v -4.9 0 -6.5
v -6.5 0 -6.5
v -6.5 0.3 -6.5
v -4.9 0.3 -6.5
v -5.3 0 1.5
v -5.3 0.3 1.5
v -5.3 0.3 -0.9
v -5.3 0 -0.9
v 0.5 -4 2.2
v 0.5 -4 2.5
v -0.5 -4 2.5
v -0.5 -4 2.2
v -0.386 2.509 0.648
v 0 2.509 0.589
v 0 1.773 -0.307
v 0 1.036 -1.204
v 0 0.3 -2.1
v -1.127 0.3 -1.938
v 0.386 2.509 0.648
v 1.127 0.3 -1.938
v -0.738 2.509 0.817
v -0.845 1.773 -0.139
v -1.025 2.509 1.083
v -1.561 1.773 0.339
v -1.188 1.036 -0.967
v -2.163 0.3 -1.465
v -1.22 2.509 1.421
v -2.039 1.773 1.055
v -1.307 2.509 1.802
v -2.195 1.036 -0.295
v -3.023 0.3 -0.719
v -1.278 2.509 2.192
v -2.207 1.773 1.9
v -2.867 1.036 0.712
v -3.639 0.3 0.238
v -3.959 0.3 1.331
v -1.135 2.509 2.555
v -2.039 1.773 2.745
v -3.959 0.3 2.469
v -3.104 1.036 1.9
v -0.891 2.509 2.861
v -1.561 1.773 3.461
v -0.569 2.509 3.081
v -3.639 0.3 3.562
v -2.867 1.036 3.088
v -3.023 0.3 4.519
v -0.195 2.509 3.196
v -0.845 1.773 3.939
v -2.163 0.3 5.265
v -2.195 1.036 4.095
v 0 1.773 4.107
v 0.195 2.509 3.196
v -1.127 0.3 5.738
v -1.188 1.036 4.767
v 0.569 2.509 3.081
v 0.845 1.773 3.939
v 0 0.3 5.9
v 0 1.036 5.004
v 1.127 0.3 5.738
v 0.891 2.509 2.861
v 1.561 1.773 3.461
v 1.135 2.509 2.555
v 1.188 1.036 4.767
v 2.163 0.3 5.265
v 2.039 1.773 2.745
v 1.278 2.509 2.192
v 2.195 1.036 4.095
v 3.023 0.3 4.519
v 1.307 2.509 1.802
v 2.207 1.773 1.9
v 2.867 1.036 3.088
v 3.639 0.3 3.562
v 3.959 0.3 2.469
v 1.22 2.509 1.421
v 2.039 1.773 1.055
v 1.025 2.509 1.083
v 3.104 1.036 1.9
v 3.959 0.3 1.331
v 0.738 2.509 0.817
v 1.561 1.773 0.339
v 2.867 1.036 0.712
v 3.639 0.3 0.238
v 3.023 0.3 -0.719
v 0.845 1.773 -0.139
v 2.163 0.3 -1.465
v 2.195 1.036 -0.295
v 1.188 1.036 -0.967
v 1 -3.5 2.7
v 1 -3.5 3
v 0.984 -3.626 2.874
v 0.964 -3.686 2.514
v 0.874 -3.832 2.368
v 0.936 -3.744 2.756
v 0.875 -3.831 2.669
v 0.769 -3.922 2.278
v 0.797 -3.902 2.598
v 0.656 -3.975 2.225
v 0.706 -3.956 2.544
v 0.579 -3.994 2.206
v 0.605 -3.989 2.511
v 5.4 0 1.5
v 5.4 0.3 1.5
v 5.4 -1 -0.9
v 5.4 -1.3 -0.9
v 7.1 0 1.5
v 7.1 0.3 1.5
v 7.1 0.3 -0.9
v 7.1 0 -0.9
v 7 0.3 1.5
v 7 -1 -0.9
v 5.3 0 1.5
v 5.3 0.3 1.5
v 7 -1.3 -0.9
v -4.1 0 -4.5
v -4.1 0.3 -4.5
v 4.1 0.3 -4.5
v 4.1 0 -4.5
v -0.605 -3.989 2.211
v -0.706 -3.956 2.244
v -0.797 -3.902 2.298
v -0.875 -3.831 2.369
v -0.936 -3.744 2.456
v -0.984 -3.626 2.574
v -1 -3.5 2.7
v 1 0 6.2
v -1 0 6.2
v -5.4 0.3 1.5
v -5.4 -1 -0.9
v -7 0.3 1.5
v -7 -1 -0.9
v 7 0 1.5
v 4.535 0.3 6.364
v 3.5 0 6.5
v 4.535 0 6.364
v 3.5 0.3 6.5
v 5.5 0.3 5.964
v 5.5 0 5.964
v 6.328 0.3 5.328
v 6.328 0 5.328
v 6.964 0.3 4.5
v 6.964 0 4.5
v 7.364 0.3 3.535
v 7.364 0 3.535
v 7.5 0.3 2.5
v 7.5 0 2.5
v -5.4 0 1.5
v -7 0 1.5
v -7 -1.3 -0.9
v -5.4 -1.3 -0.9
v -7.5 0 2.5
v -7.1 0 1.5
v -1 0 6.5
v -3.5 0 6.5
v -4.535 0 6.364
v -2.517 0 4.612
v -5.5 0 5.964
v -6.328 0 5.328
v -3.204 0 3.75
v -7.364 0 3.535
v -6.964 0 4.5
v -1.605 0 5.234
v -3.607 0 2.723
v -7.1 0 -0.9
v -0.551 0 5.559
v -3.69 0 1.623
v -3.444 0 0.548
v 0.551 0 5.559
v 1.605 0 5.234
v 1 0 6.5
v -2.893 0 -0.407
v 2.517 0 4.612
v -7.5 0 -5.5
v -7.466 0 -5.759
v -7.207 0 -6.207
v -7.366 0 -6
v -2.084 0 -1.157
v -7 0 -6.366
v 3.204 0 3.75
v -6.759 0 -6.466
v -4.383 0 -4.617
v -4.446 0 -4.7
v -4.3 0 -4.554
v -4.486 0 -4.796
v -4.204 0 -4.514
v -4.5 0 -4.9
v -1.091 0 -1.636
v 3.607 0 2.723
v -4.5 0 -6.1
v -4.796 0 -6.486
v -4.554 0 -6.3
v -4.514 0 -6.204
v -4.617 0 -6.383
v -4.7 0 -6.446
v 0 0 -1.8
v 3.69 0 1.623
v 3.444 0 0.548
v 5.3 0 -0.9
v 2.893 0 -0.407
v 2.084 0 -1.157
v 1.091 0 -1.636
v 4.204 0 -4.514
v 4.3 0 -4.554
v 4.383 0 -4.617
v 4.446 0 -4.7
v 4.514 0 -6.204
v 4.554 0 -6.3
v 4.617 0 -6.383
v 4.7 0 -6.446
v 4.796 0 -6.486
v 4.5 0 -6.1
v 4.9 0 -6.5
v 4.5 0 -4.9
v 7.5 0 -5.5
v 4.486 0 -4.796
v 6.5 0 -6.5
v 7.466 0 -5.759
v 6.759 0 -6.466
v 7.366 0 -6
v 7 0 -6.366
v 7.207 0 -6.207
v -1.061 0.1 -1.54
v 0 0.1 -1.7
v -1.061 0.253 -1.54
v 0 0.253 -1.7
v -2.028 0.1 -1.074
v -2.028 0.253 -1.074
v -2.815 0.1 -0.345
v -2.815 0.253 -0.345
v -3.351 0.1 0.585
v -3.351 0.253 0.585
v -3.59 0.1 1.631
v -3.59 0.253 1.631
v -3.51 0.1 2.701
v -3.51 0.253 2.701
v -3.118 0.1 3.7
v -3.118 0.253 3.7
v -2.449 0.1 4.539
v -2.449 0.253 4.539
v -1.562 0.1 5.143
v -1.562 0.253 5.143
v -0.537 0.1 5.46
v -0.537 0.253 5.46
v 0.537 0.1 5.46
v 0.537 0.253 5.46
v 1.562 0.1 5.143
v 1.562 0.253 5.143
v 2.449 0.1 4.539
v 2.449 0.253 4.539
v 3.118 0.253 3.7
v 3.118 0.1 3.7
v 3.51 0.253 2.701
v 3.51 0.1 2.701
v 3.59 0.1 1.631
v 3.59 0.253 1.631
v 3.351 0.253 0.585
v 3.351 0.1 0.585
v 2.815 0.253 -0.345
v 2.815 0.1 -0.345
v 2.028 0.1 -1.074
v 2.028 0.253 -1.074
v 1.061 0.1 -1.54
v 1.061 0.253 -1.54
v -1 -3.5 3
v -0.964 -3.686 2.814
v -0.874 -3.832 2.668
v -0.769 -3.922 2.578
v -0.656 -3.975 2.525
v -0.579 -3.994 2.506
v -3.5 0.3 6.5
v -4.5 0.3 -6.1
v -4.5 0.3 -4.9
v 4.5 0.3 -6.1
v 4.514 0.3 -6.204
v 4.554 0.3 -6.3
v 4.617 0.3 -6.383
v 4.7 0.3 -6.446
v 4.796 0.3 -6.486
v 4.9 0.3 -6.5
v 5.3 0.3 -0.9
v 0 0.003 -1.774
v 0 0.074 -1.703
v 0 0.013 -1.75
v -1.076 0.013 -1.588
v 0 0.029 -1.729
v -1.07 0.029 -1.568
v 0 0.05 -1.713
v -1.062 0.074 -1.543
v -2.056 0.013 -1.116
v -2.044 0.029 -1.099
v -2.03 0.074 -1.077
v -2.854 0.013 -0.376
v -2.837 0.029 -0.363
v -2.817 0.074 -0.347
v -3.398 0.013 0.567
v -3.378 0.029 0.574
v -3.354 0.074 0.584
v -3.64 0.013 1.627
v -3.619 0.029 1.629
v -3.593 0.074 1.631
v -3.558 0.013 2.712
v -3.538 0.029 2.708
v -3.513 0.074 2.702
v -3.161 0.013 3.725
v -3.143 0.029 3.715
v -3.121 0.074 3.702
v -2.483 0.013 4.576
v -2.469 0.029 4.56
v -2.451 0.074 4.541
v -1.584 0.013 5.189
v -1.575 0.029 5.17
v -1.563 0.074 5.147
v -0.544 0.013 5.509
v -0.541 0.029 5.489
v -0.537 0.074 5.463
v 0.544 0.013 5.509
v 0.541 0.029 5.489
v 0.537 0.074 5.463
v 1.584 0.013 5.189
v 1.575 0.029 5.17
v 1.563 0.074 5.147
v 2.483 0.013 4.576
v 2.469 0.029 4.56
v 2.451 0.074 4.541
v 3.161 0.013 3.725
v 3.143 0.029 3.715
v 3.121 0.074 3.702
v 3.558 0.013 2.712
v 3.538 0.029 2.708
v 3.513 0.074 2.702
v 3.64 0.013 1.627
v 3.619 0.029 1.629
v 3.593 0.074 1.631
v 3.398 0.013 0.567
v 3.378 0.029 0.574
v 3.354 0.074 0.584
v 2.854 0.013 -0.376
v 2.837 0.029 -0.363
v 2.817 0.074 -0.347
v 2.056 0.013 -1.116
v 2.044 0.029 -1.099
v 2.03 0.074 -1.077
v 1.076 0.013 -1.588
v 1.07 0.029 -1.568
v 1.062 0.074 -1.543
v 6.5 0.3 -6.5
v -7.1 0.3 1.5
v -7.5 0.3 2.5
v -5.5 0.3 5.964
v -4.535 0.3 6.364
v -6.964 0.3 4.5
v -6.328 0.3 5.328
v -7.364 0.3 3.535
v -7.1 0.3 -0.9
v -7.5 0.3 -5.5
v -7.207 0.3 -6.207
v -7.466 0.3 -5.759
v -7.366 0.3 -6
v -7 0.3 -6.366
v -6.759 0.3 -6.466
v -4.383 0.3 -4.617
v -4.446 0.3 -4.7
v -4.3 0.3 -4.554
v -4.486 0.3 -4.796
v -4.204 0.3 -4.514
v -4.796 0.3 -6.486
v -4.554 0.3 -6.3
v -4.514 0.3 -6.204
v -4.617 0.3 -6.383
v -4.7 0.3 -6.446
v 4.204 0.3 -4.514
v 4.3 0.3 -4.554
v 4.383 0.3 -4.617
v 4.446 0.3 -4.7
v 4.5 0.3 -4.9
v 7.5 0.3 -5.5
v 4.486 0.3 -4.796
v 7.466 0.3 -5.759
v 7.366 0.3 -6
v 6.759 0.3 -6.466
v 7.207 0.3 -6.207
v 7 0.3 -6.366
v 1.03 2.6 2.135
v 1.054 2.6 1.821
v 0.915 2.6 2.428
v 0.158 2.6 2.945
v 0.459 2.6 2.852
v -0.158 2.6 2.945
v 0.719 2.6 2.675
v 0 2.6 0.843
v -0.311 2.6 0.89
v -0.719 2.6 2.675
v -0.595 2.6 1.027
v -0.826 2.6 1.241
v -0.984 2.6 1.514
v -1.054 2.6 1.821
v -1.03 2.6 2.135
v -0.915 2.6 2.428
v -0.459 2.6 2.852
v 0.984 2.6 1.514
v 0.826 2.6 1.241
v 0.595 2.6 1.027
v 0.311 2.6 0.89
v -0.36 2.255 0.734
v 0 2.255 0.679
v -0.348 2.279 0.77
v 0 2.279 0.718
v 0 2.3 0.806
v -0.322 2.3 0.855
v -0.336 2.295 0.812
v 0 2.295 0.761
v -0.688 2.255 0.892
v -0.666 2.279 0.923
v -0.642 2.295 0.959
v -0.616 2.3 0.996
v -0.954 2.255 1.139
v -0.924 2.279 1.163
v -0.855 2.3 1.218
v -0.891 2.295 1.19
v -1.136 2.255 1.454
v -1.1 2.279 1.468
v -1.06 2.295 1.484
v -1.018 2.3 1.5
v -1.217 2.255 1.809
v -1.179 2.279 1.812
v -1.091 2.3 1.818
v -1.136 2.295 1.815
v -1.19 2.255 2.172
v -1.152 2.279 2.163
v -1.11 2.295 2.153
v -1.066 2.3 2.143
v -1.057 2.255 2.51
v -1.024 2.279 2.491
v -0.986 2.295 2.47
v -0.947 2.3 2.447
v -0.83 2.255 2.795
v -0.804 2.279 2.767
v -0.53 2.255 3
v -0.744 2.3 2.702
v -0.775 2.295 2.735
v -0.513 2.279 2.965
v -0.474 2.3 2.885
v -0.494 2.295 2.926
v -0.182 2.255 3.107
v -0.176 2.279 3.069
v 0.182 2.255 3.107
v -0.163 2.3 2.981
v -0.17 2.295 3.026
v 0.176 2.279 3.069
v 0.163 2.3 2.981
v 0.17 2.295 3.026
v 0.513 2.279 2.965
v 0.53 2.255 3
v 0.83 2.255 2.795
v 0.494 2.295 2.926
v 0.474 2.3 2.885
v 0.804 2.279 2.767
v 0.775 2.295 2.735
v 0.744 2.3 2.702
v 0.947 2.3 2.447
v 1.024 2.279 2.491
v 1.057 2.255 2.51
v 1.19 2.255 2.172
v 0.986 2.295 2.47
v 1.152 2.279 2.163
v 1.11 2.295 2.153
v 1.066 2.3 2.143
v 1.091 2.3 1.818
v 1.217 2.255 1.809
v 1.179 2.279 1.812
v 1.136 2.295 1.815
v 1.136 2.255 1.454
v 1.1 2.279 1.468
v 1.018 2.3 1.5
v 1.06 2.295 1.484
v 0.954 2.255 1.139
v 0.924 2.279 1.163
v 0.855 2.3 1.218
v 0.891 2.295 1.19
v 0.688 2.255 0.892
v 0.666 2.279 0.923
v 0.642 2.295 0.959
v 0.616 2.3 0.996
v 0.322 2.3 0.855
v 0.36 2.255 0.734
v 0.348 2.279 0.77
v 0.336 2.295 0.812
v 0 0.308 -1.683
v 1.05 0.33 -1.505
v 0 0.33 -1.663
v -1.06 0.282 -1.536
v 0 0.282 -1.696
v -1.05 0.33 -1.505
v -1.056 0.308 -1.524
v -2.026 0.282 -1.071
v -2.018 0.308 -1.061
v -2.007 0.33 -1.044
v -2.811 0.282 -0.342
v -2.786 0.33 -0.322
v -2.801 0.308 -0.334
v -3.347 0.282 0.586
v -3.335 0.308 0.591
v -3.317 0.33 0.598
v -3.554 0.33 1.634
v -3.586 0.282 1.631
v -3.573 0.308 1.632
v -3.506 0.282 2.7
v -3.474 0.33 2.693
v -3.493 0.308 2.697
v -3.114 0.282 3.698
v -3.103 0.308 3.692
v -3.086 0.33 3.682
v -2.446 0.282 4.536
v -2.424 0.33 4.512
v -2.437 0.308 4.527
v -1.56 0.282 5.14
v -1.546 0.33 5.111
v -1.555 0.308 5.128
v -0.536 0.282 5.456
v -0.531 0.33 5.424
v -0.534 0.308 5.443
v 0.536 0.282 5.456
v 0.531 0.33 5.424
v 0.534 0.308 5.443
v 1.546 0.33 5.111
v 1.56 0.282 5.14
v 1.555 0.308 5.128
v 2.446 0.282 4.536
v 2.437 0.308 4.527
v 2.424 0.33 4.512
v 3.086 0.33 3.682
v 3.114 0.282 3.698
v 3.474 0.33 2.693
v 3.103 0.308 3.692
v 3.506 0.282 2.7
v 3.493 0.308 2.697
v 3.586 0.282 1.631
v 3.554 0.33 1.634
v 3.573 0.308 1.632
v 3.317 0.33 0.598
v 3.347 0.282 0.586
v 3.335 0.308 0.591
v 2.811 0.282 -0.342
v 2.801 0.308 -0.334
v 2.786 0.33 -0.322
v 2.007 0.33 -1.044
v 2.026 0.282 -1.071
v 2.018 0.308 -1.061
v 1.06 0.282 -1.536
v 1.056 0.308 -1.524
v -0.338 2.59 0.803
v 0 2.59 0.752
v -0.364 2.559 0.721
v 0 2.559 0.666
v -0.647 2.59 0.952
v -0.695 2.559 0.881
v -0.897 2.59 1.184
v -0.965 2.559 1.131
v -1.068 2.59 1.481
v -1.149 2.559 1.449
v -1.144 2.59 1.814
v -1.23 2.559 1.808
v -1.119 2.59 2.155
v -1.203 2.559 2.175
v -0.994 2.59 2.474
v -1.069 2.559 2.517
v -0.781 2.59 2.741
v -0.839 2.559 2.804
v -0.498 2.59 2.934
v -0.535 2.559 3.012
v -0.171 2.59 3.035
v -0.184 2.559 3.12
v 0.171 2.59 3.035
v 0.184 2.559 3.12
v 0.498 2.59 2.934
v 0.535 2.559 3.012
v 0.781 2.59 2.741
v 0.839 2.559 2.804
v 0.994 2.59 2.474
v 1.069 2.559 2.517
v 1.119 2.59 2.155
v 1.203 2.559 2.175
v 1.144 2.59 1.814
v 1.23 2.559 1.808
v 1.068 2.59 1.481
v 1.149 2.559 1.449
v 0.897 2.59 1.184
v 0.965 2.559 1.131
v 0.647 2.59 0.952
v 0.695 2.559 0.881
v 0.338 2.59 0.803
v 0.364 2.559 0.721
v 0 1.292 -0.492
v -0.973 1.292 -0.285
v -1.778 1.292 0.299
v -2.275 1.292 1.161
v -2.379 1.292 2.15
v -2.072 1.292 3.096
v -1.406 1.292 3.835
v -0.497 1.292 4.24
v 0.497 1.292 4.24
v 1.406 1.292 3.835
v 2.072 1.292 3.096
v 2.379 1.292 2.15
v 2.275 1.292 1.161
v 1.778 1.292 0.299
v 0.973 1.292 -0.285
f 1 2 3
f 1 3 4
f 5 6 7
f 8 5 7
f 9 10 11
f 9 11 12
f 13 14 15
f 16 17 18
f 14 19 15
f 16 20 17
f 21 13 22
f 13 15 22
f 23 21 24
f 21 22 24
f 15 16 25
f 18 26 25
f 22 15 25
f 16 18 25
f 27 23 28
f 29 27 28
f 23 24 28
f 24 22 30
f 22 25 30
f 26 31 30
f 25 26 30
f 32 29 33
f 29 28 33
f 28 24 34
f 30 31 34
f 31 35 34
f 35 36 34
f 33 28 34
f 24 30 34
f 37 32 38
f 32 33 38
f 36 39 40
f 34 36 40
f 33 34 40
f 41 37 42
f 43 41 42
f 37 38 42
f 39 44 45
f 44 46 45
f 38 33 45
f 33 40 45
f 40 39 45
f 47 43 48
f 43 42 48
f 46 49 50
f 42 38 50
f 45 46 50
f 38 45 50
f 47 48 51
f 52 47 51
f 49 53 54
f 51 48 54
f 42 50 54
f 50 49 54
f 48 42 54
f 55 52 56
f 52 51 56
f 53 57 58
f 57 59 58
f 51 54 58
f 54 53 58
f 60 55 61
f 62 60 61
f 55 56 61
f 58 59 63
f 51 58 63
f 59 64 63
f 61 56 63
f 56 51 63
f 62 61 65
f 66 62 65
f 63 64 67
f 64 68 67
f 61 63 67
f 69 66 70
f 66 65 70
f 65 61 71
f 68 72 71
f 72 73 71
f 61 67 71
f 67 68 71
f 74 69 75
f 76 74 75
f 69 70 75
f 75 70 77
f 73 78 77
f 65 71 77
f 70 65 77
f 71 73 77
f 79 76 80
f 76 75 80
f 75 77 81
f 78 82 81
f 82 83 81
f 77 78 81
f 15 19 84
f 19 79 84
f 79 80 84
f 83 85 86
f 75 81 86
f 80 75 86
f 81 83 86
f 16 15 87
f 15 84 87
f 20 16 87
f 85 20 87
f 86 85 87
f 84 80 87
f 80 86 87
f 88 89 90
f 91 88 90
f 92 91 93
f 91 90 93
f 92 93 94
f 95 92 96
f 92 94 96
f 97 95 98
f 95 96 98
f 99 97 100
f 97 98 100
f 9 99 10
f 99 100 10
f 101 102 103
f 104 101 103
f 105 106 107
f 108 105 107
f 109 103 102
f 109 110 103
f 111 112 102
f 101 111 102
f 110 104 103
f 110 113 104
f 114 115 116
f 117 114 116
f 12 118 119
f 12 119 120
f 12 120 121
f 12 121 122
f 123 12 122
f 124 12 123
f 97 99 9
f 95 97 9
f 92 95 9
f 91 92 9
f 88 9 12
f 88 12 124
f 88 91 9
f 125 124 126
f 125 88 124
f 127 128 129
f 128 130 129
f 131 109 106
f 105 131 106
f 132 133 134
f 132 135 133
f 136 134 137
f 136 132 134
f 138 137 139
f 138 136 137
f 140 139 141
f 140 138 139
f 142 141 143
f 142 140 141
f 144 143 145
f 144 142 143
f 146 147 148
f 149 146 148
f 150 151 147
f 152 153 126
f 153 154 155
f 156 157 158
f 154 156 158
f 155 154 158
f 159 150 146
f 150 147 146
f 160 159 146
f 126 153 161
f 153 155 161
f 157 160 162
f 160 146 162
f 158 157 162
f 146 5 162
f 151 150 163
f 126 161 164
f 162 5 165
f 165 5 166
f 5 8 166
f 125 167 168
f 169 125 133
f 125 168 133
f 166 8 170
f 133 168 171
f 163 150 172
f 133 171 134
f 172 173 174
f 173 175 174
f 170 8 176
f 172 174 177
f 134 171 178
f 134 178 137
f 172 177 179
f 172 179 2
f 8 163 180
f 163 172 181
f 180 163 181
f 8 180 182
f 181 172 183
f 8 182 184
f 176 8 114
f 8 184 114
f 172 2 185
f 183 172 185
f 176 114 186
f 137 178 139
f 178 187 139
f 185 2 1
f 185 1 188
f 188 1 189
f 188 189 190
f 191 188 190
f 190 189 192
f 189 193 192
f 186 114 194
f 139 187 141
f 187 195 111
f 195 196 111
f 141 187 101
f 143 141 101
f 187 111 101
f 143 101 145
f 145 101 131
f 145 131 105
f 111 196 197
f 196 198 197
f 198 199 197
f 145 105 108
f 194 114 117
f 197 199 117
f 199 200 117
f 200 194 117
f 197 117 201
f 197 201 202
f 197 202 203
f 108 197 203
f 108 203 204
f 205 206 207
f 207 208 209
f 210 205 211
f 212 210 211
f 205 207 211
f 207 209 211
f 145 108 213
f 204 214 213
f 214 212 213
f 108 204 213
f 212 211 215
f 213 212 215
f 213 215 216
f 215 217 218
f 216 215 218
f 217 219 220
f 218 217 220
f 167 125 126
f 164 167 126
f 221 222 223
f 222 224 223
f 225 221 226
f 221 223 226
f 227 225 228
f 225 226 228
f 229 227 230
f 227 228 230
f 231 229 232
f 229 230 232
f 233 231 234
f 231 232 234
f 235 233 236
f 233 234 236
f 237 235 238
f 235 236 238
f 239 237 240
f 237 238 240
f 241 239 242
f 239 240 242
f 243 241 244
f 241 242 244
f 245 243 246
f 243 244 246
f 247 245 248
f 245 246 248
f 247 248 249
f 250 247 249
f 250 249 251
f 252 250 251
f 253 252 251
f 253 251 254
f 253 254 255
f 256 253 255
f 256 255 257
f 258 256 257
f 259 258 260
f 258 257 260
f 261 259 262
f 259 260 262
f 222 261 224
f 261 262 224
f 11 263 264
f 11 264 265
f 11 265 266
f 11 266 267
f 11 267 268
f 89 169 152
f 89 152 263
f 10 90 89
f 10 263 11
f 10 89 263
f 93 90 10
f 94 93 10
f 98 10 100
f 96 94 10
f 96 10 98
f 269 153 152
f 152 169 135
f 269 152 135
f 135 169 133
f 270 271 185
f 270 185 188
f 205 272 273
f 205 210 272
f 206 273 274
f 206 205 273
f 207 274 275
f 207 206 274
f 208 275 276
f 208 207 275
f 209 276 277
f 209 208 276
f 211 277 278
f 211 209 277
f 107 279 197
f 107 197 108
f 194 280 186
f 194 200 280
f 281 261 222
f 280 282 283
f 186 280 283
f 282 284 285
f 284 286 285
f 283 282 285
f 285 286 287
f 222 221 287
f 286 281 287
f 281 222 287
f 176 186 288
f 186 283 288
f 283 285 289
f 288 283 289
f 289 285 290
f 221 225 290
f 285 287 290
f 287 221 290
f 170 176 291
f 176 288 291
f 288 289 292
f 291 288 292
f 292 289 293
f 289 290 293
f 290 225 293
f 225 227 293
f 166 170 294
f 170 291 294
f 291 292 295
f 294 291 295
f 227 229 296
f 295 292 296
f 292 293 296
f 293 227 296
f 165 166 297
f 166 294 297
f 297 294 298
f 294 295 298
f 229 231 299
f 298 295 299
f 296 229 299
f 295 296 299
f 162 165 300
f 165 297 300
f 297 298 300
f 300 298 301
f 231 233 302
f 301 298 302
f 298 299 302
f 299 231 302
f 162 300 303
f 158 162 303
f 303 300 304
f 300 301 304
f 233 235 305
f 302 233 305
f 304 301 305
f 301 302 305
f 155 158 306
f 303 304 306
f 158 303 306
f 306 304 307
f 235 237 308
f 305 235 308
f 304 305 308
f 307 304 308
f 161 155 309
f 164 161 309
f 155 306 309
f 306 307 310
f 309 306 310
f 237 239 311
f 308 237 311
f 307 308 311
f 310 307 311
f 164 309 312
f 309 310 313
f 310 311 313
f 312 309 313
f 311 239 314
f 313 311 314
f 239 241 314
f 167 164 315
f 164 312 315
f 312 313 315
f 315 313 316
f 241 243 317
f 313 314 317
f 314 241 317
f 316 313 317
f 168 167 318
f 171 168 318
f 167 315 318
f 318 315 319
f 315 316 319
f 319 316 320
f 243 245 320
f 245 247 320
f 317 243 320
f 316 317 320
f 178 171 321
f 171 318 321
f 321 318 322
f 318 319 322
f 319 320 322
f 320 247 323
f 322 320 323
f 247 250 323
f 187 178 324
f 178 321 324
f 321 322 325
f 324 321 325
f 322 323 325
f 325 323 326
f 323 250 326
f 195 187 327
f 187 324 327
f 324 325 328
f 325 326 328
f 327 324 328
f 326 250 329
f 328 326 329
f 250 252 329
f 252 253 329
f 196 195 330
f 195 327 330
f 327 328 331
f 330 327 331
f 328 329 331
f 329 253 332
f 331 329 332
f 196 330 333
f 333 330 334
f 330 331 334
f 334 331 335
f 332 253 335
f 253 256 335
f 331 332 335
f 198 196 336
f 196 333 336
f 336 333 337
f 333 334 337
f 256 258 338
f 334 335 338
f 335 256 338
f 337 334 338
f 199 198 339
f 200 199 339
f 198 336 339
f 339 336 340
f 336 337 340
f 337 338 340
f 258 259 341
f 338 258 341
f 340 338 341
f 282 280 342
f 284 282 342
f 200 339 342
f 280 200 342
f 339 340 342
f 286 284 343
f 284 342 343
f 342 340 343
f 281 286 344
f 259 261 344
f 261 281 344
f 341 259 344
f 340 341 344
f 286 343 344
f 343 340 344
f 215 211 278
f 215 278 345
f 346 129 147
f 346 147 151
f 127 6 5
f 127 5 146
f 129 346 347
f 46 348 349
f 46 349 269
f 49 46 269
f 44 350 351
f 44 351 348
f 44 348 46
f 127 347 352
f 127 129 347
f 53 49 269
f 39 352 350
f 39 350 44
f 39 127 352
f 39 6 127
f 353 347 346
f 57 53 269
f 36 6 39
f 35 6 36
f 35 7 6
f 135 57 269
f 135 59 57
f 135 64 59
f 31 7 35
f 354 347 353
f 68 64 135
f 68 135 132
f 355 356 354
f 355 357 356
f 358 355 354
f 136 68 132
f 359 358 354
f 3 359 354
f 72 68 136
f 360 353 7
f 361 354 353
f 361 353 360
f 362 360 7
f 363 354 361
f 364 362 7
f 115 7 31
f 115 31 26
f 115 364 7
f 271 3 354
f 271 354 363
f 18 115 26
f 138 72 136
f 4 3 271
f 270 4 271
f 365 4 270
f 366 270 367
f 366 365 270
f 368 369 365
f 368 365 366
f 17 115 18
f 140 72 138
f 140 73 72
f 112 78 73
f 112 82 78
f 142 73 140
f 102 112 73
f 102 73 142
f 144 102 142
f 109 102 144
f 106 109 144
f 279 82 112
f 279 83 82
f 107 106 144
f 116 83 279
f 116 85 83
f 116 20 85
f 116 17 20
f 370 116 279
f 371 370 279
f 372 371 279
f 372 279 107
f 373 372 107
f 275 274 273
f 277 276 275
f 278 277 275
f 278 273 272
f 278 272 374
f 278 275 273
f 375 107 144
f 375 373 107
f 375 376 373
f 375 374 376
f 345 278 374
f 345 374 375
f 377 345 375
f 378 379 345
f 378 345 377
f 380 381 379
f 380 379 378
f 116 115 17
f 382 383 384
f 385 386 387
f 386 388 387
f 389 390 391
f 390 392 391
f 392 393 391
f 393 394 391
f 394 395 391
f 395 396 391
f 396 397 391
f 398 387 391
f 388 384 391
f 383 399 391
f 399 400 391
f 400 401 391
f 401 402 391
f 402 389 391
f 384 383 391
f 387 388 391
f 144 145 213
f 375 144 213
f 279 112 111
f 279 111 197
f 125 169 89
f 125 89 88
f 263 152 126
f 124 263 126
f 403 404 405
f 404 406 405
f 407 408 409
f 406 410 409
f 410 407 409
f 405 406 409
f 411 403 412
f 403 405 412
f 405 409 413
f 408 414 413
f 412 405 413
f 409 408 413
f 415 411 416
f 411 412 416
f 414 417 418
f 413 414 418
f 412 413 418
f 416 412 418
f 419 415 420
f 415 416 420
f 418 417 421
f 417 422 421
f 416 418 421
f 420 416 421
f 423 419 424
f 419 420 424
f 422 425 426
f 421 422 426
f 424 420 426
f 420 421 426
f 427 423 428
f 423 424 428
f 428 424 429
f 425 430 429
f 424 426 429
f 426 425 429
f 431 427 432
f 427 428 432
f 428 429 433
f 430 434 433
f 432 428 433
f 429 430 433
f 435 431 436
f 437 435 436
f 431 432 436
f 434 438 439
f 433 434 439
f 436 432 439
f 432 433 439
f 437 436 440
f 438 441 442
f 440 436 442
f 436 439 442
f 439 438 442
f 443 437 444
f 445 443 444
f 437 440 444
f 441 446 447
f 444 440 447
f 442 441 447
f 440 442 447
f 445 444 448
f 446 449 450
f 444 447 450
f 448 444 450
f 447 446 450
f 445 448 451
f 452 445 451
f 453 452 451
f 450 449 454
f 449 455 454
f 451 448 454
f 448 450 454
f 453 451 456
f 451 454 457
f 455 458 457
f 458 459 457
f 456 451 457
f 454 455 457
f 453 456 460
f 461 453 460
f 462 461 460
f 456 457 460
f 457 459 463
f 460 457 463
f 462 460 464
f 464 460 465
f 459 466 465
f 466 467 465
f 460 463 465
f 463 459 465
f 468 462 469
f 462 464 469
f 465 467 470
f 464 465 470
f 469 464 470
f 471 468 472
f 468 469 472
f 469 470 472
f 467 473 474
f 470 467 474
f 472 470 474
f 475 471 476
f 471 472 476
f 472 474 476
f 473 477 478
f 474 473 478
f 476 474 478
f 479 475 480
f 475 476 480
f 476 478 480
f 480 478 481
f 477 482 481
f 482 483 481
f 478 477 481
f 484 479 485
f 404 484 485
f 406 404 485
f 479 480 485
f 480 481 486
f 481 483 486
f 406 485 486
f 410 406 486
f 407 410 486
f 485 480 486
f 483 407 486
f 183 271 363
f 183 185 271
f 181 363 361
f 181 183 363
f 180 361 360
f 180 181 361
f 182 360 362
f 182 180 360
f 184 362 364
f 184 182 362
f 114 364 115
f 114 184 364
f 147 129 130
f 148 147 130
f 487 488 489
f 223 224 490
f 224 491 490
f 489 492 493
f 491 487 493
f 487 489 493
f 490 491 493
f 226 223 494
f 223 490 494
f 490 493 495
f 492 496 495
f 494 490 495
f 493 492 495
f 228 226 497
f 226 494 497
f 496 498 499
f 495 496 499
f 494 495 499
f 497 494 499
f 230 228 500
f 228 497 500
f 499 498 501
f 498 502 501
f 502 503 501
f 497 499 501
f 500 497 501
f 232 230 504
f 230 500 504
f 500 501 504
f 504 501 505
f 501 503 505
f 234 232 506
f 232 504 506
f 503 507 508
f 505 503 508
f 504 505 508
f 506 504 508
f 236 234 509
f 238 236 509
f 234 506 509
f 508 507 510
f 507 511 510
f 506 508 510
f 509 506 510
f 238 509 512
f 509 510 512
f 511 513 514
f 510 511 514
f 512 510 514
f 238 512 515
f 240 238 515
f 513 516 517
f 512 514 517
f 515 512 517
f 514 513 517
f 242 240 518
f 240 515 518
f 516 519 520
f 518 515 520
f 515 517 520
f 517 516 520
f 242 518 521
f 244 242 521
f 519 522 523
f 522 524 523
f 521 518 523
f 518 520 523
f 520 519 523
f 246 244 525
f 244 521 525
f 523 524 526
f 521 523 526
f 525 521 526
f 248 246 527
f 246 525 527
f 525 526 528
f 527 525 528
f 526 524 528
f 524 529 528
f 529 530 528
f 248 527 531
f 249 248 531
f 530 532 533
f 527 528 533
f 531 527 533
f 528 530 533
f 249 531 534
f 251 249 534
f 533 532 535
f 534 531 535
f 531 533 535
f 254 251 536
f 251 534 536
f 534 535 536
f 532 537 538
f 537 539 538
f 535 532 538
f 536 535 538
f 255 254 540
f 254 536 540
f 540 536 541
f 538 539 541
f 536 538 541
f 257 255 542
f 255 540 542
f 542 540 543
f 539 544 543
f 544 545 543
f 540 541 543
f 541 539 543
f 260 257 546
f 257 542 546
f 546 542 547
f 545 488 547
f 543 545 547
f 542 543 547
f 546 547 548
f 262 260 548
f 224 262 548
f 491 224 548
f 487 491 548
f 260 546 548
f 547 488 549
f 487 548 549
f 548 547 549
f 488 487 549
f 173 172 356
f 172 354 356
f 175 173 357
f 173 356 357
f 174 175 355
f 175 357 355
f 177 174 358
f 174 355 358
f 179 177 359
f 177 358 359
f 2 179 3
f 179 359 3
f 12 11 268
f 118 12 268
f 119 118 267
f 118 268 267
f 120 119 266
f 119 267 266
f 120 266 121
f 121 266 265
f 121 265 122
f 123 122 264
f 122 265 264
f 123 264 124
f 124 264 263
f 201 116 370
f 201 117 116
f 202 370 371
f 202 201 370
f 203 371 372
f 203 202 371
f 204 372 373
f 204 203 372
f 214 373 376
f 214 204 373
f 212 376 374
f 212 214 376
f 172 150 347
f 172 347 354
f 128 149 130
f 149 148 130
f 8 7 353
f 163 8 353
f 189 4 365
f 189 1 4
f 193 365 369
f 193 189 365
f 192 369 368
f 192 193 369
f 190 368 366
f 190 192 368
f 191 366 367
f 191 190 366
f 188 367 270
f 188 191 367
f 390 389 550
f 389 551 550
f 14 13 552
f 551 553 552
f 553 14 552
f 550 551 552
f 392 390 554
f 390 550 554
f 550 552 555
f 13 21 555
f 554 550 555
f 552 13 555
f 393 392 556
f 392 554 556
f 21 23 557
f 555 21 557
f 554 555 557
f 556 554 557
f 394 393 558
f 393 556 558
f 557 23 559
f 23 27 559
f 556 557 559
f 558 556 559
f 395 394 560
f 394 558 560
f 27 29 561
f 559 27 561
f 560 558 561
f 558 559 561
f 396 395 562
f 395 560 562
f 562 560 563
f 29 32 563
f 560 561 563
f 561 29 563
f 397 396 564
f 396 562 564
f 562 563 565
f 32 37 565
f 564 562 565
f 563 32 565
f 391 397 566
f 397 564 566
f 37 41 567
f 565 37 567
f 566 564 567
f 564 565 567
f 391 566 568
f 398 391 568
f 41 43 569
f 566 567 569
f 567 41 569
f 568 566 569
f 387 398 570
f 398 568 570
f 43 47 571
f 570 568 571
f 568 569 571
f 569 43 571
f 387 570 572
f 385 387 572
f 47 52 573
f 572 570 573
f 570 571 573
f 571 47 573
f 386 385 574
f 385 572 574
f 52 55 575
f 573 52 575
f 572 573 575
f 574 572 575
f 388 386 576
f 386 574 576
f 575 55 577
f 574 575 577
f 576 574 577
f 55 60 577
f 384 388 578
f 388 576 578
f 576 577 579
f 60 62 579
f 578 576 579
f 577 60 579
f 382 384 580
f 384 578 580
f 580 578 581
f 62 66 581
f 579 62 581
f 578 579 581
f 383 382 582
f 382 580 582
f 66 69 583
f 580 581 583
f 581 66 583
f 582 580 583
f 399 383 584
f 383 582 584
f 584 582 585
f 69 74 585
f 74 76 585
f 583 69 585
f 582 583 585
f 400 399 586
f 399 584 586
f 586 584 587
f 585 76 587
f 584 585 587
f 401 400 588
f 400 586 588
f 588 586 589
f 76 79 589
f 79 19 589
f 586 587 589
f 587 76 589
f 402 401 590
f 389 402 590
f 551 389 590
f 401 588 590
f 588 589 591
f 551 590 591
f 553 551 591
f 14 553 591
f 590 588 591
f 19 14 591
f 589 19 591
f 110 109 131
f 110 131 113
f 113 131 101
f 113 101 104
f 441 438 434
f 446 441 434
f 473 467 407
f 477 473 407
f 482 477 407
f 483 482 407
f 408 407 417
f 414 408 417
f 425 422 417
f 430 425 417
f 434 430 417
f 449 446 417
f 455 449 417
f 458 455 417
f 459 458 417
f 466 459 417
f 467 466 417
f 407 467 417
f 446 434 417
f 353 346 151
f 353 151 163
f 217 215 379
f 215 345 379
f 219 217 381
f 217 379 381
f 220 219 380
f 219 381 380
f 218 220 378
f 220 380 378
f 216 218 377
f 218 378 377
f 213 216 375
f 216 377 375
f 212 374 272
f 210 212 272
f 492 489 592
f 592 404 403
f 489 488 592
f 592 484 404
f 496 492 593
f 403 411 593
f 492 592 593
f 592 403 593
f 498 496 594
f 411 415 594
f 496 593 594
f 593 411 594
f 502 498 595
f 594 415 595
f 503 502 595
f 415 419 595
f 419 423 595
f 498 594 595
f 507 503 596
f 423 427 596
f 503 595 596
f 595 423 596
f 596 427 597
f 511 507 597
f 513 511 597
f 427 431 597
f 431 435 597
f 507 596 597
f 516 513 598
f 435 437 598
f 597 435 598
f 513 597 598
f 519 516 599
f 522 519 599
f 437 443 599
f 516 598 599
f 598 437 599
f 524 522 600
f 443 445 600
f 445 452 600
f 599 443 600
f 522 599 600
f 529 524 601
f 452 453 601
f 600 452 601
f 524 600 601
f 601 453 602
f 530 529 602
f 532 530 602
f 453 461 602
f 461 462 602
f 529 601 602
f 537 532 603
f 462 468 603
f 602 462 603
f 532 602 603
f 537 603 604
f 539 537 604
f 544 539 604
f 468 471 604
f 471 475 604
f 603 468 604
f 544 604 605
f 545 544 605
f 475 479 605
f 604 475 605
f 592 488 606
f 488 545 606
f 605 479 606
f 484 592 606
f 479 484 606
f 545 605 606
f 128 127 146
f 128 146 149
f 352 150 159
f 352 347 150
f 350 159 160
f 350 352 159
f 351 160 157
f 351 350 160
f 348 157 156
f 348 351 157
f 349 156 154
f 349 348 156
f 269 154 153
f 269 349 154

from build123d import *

# Parameters (mm, degrees)
SKETCH1_W               = 15
SKETCH1_H               = 13
BASE_DEPTH              = 0.3
SKETCH2_R               = 4
PT_CUT_DEPTH            = 10.92924972
WIRE_CONNECTION_DEPTH   = 1
SKETCH7_W               = 1.8
SKETCH7_H               = 2.4
LOCKING_CLAMP_CUT_DEPTH = 11.816191566
LOCKING_CLAMP_DEPTH     = 0.8
SKETCH9_W               = 9
SKETCH9_H               = 2
BOTTOM_SLOT_CUT_DEPTH   = 11.816191566
TS_F_R                  = 1
BS_F_R                  = 4
WC_F_R                  = 0.5
BSC_F_R                 = 0.4


with BuildPart() as part:
    # Sketch1 → BASE (new body)
    with BuildSketch(Plane(origin=(0, 0, 0), x_dir=(1, 0, 0), z_dir=(0, 1, 0))):
        Rectangle(SKETCH1_W, SKETCH1_H)
    extrude(amount=BASE_DEPTH)

    # Sketch2 → PT CUT (cut, through all)
    with BuildSketch(Plane(origin=(0, 0.3, 0), x_dir=(1, 0, 0), z_dir=(0, 1, 0))):
        with Locations(Location((0, -1.9, 0), (0, 0, 270))):
            Circle(SKETCH2_R)
    extrude(amount=-PT_CUT_DEPTH, mode=Mode.SUBTRACT)

    # Sketch4 → POSITIVE TERMINAL (revolve)
    with BuildSketch(Plane.XY.offset(1.9), mode=Mode.PRIVATE) as positive_terminal_sk:
        with BuildLine():
            Line((0, 2.6), (1.056776663, 2.6))
            ThreePointArc((1.056776663, 2.6), (1.191616938, 2.576587441), (1.310672433, 2.509090502))
            Line((1.310672433, 2.509090502), (4, 0.3))
            Line((4, 0.3), (4, 0))
            Line((4, 0), (3.7, 0))
            ThreePointArc((3.7, 0), (3.629289322, 0.029289322), (3.6, 0.1))
            Line((3.6, 0.1), (3.6, 0.252730922))
            ThreePointArc((3.6, 0.252730922), (3.590408501, 0.295466187), (3.563473942, 0.330003547))
            Line((3.563473942, 0.330003547), (1.220553608, 2.254545251))
            ThreePointArc((1.220553608, 2.254545251), (1.16102586, 2.28829372), (1.093605723, 2.3))
            Line((1.093605723, 2.3), (0, 2.3))
            Line((0, 2.3), (0, 2.6))
        make_face()
    revolve(positive_terminal_sk.sketch.rotate(Axis((0, 0, 1.9), (0, 1, 0)), 90), axis=Axis((0, 0, 1.9), (0, 1, 0)))

    # Sketch5 → WIRE CONNECTION (add, symmetric)
    with BuildSketch(Plane(origin=(0, 0, 0), x_dir=(0, 0, -1), z_dir=(1, 0, 0))):
        Polygon((-6.5, 0), (-2.5, -4), (-2.2, -4), (-6.2, 0), align=None)
    extrude(amount=WIRE_CONNECTION_DEPTH, both=True)

    # Sketch7 → LOCKING CLAMP CUT (cut, through all)
    with BuildSketch(Plane(origin=(0, 0.3, 0), x_dir=(1, 0, 0), z_dir=(0, 1, 0))):
        with Locations((6.2, -0.3)):
            Rectangle(SKETCH7_W, SKETCH7_H)
    locking_clamp_cut = extrude(amount=-LOCKING_CLAMP_CUT_DEPTH, mode=Mode.SUBTRACT)

    # Sketch8 → LOCKING CLAMP (add, symmetric)
    with BuildSketch(Plane(origin=(6.2, 0, 0), x_dir=(0, 0, -1), z_dir=(1, 0, 0))):
        Polygon((0.9, -1), (-1.5, 0.3), (-1.5, 0), (0.9, -1.3), align=None)
    locking_clamp = extrude(amount=LOCKING_CLAMP_DEPTH, both=True)

    # LC M: LOCKING CLAMP CUT, LOCKING CLAMP across plane
    add(locking_clamp_cut.mirror(Plane(origin=(0, 0, 0), x_dir=(0, 0, 1), z_dir=(1, 0, 0))), mode=Mode.SUBTRACT)
    add(locking_clamp.mirror(Plane(origin=(0, 0, 0), x_dir=(0, 0, 1), z_dir=(1, 0, 0))))

    # Sketch9 → BOTTOM SLOT CUT (cut, through all)
    with BuildSketch(Plane(origin=(0, 0.3, 0), x_dir=(1, 0, 0), z_dir=(0, 1, 0))):
        with Locations((0, 5.5)):
            Rectangle(SKETCH9_W, SKETCH9_H)
    extrude(amount=-BOTTOM_SLOT_CUT_DEPTH, mode=Mode.SUBTRACT)

    # TS F
    ts_f_edges = [part.edges().sort_by_distance(p)[0] for p in [
        (-7.5, 0.15, -6.5),
        (7.5, 0.15, -6.5),
    ]]
    fillet(ts_f_edges, radius=TS_F_R)

    # BS F
    bs_f_edges = [part.edges().sort_by_distance(p)[0] for p in [
        (7.5, 0.15, 6.5),
        (-7.5, 0.15, 6.5),
    ]]
    fillet(bs_f_edges, radius=BS_F_R)

    # WC F
    # the kernel refuses this fillet: 0.5 mm, written as the material it takes off along each edge
    with BuildSketch(Plane(origin=(-1, -4, 3.75), x_dir=(0, 1, 0), z_dir=(0, 0, -1))) as wc_f_piece_1:
        with BuildLine():
            CenterArc((WC_F_R, WC_F_R), WC_F_R, 180, 90)
            Line((0, WC_F_R), (0, 0))
            Line((0, 0), (WC_F_R, 0))
        make_face()
    extrude(amount=2.8, mode=Mode.SUBTRACT)
    with BuildSketch(Plane(origin=(1, -4, 3.75), x_dir=(0, 1, 0), z_dir=(0, 0, -1))) as wc_f_piece_2:
        with BuildLine():
            CenterArc((WC_F_R, -WC_F_R), WC_F_R, 90, 90)
            Line((0, -WC_F_R), (0, 0))
            Line((0, 0), (WC_F_R, 0))
        make_face()
    extrude(amount=2.8, mode=Mode.SUBTRACT)

    # BSC F
    bsc_f_edges = [part.edges().sort_by_distance(p)[0] for p in [
        (-4.5, 0.15, -6.5),
        (4.5, 0.15, -6.5),
        (4.5, 0.15, -4.5),
        (-4.5, 0.15, -4.5),
    ]]
    fillet(bsc_f_edges, radius=BSC_F_R)


solid = part.part
